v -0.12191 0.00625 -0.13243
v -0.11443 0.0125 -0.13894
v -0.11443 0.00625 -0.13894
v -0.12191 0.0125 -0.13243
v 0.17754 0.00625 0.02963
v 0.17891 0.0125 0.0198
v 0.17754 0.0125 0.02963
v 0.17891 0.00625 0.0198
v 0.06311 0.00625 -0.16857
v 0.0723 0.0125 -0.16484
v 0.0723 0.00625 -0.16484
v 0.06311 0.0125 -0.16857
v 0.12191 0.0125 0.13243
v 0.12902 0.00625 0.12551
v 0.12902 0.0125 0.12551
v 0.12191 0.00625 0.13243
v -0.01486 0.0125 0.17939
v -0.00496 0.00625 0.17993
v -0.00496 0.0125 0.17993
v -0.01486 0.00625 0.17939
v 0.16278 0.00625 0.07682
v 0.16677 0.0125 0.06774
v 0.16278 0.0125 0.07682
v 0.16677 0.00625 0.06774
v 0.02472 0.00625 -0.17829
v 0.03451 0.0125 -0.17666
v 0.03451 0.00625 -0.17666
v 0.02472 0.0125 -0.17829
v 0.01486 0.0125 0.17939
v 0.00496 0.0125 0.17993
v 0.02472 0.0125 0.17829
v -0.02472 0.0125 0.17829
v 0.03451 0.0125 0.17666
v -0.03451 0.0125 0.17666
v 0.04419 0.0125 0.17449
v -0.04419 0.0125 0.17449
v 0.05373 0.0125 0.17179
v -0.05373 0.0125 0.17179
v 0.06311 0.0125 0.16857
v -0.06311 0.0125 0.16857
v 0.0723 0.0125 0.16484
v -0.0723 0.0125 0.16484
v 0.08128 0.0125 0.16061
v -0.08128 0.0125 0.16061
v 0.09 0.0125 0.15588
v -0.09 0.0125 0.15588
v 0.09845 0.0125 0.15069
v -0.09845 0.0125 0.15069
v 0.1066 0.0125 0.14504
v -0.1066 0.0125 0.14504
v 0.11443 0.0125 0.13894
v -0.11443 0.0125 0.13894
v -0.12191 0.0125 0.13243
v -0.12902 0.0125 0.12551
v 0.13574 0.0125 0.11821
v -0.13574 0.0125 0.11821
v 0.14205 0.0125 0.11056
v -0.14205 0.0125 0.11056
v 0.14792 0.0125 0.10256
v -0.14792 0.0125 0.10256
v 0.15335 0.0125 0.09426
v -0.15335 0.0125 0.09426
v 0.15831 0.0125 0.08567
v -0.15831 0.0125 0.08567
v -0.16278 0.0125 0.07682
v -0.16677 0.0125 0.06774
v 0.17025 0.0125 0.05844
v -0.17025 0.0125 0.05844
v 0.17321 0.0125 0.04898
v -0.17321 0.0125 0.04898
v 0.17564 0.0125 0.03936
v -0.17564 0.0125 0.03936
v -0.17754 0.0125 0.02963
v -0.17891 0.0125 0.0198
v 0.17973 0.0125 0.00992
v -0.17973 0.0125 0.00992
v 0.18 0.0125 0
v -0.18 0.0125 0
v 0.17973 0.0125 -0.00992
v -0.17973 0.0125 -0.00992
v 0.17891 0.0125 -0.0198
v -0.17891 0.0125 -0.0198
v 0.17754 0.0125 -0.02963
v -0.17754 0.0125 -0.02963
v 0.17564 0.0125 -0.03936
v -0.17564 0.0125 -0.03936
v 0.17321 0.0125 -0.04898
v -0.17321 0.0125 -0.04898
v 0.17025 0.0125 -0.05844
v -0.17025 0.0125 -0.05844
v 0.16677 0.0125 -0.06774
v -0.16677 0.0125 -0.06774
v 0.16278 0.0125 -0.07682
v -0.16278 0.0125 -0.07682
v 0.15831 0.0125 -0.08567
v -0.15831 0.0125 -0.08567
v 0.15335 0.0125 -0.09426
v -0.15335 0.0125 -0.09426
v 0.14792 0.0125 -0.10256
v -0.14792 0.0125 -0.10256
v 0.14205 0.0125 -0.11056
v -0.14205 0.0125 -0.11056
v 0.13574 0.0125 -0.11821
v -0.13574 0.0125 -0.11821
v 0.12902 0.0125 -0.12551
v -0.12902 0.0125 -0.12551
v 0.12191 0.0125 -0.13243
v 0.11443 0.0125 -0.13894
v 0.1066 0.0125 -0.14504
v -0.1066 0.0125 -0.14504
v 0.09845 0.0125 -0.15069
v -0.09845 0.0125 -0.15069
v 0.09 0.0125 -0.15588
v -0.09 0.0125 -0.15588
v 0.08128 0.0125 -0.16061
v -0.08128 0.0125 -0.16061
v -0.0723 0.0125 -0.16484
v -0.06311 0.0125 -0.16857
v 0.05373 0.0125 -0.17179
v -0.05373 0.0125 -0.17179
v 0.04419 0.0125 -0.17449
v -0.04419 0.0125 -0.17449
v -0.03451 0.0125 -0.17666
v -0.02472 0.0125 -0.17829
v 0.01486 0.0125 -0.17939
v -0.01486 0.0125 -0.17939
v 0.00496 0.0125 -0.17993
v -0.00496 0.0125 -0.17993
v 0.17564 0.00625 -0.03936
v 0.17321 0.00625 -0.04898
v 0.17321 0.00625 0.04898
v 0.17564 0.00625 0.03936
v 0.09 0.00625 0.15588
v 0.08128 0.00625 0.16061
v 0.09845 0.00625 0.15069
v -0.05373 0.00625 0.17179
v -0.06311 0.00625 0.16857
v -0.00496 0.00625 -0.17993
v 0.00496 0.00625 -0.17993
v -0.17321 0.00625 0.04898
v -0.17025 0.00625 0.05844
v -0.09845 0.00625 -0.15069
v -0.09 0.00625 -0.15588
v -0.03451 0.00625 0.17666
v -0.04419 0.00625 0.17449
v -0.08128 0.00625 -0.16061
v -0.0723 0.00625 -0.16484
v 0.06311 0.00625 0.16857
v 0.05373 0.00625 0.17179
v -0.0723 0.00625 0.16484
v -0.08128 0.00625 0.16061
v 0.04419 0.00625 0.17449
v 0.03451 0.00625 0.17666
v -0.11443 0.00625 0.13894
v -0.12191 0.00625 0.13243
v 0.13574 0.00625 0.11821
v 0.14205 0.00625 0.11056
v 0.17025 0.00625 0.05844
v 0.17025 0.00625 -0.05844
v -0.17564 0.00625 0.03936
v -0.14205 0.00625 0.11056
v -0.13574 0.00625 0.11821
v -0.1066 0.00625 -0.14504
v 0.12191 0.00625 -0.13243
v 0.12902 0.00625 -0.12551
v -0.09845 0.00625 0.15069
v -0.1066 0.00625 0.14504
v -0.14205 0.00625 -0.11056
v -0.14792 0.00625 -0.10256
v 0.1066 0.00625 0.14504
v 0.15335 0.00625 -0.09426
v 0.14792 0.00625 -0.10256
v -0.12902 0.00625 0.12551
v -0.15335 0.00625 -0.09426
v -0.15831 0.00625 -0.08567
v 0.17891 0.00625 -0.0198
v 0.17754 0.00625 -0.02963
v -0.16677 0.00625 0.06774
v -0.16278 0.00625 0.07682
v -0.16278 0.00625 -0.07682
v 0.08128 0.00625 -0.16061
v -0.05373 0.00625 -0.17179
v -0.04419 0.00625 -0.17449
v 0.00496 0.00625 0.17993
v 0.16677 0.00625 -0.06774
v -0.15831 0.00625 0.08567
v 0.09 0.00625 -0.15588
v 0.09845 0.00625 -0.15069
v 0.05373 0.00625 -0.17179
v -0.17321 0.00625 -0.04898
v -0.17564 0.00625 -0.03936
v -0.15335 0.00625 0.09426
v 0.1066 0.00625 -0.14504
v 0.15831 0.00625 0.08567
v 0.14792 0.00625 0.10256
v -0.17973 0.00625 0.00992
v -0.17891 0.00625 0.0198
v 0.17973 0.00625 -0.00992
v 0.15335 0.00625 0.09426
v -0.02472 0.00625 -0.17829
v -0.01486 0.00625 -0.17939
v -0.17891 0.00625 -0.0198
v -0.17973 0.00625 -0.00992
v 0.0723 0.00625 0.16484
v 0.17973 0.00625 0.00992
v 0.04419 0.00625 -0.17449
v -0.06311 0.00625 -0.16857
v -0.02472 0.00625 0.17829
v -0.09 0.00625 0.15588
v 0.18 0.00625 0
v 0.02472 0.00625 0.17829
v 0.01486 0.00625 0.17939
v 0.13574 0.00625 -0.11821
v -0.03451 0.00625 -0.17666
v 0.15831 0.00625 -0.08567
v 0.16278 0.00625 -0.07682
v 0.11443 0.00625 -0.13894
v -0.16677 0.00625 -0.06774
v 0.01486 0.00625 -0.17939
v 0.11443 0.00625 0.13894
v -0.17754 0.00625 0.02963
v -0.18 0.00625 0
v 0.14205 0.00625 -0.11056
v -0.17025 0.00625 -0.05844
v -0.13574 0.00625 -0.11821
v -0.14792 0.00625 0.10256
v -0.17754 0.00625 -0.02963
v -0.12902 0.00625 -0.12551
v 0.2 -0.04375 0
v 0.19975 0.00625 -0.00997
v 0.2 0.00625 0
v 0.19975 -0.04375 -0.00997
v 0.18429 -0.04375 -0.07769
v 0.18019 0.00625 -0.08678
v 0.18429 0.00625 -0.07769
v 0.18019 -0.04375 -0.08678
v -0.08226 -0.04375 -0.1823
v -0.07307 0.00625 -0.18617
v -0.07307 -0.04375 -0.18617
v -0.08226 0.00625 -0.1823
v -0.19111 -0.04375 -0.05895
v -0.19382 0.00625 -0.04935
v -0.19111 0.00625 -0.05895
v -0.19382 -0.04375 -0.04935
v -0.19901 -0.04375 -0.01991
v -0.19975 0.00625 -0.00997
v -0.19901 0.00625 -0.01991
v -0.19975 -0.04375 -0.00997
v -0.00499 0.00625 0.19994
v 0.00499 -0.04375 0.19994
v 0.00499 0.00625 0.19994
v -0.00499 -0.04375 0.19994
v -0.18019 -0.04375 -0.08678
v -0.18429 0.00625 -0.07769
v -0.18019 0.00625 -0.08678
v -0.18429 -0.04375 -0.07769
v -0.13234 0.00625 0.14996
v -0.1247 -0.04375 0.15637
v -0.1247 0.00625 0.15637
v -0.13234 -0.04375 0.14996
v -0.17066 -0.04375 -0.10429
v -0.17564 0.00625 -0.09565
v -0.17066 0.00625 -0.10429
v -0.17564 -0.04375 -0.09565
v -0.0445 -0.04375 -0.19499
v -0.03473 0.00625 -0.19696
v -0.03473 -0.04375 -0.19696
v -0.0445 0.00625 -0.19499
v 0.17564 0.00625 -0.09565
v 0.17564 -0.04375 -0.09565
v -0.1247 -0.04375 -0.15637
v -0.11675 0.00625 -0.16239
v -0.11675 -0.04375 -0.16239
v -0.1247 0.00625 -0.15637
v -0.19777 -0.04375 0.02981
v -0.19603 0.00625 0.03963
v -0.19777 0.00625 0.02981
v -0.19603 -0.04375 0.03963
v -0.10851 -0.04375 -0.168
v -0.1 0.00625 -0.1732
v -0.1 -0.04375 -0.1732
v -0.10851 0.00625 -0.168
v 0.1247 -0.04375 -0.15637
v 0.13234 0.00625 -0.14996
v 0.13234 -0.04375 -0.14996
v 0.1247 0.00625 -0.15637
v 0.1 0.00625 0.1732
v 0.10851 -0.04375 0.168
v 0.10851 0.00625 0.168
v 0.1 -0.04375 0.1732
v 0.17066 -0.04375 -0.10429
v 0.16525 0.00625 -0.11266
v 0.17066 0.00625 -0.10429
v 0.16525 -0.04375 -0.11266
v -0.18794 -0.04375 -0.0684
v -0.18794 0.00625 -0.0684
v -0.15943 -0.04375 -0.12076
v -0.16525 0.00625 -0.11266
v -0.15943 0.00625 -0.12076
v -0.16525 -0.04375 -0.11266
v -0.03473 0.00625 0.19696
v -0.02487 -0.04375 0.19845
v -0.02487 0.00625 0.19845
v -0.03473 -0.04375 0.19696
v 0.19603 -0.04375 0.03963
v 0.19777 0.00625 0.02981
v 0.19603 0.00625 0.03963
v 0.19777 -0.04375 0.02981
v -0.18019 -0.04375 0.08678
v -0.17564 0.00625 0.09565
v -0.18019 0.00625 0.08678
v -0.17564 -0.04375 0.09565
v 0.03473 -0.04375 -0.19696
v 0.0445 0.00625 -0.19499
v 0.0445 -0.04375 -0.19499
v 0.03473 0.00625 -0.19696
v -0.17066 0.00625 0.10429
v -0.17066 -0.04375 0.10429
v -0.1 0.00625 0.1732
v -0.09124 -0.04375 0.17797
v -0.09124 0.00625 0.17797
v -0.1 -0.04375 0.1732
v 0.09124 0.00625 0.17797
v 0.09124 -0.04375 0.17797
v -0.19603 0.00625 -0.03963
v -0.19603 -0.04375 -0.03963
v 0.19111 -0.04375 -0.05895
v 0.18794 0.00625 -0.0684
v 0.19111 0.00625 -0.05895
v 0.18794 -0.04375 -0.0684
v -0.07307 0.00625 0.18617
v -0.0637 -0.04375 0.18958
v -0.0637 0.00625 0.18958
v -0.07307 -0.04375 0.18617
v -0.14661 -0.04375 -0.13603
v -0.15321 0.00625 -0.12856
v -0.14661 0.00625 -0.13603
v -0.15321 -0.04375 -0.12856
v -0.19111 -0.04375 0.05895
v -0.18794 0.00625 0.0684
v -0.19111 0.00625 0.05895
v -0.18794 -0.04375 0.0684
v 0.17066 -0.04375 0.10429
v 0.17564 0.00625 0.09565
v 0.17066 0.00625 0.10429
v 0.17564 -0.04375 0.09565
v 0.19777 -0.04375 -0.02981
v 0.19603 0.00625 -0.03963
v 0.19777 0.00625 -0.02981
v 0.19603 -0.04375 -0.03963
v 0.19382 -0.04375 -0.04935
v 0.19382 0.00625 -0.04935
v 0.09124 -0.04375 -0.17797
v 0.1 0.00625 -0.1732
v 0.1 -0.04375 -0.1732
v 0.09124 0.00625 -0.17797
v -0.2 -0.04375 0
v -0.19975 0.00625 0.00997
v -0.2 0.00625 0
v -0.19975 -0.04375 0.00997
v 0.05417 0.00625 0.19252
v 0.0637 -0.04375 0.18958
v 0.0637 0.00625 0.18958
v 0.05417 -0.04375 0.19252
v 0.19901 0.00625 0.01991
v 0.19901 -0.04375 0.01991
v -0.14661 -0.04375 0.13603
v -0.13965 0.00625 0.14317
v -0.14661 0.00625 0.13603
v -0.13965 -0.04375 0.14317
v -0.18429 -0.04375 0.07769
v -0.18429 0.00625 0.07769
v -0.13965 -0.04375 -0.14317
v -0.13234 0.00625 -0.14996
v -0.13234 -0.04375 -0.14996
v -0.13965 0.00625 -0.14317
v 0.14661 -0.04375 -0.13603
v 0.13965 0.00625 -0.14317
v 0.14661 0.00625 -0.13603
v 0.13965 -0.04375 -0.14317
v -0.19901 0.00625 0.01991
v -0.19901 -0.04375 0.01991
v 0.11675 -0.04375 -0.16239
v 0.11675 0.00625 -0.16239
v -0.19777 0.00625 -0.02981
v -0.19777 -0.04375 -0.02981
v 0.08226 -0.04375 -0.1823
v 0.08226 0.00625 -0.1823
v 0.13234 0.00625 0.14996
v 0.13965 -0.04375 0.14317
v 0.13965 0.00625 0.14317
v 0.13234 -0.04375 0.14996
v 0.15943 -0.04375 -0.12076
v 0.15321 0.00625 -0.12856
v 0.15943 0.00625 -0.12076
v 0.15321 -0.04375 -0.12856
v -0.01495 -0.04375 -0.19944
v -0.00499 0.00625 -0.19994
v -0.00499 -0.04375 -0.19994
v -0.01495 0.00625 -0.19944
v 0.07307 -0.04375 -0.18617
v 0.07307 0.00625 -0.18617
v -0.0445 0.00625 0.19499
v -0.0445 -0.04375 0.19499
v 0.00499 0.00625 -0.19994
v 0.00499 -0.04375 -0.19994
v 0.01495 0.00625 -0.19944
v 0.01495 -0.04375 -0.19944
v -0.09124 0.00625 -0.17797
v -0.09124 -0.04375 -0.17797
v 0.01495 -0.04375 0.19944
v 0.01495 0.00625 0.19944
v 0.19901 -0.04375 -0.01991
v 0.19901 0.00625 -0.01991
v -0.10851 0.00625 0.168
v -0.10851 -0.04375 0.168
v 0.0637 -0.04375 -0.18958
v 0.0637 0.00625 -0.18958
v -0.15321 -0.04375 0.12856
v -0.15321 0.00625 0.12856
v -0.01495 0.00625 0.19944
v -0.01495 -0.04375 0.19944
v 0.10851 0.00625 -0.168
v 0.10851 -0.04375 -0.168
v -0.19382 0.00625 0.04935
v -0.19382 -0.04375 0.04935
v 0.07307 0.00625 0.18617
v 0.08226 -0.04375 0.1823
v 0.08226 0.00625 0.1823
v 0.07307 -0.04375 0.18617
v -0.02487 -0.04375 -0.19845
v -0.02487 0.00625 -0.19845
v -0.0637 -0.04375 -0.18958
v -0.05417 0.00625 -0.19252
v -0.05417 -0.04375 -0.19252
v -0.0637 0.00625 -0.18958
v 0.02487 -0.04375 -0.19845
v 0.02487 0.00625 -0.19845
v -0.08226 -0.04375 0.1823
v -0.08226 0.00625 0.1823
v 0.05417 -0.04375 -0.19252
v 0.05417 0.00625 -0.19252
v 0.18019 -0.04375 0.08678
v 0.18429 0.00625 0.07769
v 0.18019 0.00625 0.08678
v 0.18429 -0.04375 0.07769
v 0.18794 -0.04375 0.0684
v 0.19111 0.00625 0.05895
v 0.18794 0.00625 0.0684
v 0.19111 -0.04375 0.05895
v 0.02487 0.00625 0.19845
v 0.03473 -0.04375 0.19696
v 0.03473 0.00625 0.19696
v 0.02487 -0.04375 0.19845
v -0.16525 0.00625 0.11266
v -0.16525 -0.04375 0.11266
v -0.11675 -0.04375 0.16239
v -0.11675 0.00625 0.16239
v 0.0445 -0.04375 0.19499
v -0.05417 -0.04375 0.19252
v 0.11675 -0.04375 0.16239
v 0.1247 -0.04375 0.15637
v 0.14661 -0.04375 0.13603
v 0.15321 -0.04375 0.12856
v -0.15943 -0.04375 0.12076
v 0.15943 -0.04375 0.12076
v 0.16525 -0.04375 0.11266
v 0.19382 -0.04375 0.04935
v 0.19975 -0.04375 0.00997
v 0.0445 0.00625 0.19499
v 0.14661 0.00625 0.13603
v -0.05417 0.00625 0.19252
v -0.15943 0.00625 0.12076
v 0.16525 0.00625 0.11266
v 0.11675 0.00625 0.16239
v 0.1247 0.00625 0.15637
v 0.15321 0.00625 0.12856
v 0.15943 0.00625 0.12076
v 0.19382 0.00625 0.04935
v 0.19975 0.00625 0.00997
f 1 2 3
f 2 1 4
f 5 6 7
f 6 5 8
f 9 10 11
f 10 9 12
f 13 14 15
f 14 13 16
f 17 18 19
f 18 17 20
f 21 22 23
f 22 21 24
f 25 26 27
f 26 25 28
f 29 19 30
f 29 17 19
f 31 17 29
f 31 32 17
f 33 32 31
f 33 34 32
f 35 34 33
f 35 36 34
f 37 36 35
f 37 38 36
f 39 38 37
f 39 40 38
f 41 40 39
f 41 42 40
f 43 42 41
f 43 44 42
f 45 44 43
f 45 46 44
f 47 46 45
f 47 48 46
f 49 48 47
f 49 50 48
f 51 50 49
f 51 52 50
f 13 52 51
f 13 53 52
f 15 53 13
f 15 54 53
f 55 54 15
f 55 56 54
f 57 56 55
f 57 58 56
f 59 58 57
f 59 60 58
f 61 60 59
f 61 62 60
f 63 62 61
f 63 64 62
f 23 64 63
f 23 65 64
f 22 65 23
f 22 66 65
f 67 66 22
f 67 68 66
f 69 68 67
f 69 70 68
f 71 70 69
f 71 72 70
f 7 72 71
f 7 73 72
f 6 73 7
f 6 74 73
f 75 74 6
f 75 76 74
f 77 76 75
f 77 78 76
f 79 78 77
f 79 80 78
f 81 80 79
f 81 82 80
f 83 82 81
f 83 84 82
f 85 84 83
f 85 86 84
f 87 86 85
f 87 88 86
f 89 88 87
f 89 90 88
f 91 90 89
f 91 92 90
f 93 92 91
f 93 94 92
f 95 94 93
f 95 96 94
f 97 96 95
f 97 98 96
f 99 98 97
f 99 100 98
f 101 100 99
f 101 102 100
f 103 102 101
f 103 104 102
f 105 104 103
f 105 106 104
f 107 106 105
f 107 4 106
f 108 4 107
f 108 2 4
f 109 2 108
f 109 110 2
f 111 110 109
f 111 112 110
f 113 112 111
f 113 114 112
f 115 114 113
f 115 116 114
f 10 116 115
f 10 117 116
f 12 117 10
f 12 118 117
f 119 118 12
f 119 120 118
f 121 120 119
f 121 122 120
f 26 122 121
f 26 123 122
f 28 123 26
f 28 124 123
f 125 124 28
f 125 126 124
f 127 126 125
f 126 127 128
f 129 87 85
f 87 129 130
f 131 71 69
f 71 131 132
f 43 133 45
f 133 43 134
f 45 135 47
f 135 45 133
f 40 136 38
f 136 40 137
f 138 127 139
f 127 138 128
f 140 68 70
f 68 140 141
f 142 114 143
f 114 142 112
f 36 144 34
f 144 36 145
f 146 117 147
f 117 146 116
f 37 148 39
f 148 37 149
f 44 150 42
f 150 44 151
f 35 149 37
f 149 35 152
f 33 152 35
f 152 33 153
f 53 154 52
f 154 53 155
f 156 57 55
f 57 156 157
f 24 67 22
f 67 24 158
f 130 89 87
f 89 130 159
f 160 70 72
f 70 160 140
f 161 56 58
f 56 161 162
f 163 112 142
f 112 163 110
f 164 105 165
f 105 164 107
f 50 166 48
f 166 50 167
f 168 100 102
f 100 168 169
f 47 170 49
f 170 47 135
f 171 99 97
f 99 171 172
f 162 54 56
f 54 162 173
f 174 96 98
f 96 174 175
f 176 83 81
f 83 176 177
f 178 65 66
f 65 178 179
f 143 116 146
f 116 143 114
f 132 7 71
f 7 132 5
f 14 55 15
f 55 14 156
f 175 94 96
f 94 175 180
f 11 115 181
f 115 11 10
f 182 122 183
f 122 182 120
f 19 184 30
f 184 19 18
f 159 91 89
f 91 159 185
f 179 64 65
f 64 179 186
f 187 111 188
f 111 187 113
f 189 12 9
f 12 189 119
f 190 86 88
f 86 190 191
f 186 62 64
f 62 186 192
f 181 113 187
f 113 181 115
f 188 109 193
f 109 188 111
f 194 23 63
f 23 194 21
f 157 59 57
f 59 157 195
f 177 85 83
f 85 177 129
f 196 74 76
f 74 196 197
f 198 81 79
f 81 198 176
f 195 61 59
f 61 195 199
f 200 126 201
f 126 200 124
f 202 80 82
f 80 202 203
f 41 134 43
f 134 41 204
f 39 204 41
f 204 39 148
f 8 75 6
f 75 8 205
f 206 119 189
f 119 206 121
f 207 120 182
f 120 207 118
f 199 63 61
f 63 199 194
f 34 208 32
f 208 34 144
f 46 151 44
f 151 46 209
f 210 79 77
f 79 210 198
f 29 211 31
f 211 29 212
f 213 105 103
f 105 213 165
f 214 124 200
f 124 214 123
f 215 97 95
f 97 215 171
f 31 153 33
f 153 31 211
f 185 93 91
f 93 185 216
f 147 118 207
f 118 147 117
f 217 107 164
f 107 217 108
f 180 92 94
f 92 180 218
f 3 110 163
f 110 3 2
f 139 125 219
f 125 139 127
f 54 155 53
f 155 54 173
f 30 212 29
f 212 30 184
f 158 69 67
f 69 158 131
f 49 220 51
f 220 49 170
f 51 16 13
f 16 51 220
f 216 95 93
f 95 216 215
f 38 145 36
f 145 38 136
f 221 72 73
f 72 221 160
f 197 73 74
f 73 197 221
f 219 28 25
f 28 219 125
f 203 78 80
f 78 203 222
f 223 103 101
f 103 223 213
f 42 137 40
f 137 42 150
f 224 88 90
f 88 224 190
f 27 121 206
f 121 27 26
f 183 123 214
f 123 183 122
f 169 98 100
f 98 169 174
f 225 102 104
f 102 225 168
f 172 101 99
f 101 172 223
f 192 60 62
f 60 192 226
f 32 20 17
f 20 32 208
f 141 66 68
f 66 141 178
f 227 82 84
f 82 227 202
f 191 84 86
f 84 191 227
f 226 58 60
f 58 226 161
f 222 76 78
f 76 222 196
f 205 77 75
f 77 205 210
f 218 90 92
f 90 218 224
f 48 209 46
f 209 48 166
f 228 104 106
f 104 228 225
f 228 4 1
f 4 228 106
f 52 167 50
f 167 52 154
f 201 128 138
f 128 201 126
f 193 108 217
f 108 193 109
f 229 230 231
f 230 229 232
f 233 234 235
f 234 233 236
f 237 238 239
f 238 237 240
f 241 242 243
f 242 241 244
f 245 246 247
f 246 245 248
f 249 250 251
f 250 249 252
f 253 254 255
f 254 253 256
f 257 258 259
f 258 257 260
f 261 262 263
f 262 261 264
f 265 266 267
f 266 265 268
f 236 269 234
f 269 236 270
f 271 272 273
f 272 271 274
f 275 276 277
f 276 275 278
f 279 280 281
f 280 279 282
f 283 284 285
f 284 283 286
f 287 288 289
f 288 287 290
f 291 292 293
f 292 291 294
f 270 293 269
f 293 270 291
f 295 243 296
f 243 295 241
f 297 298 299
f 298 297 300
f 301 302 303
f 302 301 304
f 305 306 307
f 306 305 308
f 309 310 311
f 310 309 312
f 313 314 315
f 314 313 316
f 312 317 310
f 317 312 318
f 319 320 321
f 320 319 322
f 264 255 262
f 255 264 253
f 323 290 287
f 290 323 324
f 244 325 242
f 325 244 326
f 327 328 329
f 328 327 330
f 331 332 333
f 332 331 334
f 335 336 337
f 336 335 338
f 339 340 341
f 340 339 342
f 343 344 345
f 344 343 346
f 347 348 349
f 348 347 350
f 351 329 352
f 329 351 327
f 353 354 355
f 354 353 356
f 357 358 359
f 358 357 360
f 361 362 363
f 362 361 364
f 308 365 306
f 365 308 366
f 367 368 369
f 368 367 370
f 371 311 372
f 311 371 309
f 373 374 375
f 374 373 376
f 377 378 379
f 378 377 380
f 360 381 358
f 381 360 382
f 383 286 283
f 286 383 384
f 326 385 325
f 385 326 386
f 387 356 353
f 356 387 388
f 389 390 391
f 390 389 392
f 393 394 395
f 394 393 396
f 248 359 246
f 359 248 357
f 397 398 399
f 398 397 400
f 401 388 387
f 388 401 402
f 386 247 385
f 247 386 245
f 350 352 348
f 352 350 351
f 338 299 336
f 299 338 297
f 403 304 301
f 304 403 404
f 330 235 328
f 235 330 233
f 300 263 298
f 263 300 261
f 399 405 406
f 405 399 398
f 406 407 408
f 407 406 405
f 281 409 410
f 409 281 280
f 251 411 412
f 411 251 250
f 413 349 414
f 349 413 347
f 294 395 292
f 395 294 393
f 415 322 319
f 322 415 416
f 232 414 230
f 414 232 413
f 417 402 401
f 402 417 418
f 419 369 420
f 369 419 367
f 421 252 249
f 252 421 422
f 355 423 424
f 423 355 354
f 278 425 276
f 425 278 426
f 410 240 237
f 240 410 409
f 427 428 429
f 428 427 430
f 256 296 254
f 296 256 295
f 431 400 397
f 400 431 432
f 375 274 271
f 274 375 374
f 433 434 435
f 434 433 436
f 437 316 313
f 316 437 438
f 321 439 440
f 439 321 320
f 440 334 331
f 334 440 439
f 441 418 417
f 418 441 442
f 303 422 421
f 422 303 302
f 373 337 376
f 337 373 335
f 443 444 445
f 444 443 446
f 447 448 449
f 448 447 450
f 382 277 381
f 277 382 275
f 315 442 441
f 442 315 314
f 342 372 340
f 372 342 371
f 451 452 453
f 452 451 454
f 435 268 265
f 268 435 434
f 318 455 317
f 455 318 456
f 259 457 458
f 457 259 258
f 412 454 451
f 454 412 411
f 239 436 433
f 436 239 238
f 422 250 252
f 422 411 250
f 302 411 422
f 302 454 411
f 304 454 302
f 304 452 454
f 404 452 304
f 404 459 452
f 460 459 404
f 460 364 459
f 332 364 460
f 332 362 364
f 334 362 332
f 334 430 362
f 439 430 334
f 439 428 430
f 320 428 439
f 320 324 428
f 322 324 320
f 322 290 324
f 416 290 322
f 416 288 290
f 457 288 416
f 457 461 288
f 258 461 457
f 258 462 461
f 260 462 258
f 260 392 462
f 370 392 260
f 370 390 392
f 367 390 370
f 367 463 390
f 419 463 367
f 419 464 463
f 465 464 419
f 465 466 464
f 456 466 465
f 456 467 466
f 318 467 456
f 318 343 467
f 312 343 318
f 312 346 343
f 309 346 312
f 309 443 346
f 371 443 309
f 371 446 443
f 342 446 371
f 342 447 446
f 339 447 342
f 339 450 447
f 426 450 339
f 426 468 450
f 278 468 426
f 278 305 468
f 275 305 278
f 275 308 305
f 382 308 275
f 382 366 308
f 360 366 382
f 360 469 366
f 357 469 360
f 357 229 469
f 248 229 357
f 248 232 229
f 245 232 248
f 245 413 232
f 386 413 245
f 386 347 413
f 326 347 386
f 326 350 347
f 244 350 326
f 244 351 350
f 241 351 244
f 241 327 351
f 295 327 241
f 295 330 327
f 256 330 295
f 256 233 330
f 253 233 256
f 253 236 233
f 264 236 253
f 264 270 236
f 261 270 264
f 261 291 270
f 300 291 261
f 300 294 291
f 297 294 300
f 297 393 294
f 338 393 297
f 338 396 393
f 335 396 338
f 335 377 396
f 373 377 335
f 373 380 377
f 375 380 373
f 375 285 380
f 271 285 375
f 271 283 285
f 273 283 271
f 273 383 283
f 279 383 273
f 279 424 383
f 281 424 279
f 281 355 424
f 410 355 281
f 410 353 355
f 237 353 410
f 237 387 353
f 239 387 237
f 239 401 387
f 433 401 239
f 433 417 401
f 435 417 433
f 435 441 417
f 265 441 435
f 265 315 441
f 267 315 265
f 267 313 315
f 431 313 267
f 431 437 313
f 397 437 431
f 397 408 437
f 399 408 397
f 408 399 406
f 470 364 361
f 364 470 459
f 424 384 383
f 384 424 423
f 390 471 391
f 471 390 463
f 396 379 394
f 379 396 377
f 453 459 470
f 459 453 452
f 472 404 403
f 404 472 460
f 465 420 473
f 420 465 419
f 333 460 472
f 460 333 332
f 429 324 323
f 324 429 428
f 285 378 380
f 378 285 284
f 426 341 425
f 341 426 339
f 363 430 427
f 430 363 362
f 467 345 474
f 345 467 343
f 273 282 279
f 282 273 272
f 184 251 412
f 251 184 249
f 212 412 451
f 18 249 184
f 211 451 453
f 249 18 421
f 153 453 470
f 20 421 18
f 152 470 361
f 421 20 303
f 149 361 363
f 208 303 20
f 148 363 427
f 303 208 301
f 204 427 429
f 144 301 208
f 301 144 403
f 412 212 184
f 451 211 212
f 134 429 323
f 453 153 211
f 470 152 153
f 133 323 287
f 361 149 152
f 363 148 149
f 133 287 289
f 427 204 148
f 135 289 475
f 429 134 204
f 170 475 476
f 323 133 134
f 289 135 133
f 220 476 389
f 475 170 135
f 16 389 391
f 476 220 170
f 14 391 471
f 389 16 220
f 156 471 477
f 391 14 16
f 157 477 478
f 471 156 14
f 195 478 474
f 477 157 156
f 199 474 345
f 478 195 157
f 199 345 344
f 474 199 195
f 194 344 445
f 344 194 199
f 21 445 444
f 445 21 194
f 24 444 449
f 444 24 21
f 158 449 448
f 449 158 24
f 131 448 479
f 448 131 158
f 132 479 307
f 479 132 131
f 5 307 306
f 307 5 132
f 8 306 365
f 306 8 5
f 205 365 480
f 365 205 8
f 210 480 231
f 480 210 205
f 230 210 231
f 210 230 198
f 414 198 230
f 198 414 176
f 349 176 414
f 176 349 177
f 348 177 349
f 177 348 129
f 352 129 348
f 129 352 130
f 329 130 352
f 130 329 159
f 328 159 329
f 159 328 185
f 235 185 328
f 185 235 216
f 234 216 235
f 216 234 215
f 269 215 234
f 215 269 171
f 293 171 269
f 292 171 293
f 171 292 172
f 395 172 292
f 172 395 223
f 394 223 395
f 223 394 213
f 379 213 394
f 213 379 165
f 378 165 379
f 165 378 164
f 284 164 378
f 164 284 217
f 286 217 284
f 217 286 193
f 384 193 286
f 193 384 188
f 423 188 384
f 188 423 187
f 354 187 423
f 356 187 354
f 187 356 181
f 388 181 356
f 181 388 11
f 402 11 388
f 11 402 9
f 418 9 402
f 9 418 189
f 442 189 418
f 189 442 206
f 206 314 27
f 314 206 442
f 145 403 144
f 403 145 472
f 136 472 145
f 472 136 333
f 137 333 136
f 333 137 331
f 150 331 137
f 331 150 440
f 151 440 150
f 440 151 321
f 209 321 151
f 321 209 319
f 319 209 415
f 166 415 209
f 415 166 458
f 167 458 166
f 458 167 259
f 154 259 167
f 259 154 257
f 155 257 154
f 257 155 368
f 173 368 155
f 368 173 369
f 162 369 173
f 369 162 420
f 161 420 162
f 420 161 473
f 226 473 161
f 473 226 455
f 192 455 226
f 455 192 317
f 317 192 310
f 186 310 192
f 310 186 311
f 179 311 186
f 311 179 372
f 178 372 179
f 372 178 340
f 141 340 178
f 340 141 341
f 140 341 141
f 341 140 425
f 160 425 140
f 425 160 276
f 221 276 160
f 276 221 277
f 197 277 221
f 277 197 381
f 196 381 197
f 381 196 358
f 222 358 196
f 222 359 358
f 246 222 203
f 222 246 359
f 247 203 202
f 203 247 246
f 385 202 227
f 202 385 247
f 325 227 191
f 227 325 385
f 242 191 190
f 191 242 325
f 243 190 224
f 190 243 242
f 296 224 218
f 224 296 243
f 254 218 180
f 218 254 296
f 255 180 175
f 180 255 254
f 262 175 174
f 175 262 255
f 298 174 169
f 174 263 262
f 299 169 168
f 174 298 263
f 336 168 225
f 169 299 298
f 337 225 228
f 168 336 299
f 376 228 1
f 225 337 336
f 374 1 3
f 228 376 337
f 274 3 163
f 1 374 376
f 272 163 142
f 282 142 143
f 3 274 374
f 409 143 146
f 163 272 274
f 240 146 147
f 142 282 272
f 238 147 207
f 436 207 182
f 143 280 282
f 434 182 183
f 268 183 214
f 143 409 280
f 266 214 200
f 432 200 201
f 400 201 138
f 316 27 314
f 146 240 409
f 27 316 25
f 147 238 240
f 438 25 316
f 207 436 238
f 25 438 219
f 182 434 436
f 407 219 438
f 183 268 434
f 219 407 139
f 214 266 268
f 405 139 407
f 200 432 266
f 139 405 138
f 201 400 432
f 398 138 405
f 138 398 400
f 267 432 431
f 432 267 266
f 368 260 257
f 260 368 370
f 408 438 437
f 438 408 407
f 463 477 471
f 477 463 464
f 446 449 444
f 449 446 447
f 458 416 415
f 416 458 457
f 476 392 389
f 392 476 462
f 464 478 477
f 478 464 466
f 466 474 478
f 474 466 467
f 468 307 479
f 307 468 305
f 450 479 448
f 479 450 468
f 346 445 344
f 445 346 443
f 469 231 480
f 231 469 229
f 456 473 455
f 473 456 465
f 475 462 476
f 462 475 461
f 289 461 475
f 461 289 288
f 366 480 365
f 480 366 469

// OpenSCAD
include_base = true;
include_top = true;
$fa = 1;
$fs = 0.01;
mag = 1;
thickness = mag * 0.05;
base_radius = mag * 0.2;
top_radius = mag * 0.18;
rotate([90,0,0]) {
  if (include_top) {
    translate([0,0,-thickness/4])
    linear_extrude(thickness)
    circle(top_radius);
  }
  if (include_base) {
    translate([0,0,-thickness/8])
    linear_extrude(thickness)
    circle(base_radius);
  }
}
